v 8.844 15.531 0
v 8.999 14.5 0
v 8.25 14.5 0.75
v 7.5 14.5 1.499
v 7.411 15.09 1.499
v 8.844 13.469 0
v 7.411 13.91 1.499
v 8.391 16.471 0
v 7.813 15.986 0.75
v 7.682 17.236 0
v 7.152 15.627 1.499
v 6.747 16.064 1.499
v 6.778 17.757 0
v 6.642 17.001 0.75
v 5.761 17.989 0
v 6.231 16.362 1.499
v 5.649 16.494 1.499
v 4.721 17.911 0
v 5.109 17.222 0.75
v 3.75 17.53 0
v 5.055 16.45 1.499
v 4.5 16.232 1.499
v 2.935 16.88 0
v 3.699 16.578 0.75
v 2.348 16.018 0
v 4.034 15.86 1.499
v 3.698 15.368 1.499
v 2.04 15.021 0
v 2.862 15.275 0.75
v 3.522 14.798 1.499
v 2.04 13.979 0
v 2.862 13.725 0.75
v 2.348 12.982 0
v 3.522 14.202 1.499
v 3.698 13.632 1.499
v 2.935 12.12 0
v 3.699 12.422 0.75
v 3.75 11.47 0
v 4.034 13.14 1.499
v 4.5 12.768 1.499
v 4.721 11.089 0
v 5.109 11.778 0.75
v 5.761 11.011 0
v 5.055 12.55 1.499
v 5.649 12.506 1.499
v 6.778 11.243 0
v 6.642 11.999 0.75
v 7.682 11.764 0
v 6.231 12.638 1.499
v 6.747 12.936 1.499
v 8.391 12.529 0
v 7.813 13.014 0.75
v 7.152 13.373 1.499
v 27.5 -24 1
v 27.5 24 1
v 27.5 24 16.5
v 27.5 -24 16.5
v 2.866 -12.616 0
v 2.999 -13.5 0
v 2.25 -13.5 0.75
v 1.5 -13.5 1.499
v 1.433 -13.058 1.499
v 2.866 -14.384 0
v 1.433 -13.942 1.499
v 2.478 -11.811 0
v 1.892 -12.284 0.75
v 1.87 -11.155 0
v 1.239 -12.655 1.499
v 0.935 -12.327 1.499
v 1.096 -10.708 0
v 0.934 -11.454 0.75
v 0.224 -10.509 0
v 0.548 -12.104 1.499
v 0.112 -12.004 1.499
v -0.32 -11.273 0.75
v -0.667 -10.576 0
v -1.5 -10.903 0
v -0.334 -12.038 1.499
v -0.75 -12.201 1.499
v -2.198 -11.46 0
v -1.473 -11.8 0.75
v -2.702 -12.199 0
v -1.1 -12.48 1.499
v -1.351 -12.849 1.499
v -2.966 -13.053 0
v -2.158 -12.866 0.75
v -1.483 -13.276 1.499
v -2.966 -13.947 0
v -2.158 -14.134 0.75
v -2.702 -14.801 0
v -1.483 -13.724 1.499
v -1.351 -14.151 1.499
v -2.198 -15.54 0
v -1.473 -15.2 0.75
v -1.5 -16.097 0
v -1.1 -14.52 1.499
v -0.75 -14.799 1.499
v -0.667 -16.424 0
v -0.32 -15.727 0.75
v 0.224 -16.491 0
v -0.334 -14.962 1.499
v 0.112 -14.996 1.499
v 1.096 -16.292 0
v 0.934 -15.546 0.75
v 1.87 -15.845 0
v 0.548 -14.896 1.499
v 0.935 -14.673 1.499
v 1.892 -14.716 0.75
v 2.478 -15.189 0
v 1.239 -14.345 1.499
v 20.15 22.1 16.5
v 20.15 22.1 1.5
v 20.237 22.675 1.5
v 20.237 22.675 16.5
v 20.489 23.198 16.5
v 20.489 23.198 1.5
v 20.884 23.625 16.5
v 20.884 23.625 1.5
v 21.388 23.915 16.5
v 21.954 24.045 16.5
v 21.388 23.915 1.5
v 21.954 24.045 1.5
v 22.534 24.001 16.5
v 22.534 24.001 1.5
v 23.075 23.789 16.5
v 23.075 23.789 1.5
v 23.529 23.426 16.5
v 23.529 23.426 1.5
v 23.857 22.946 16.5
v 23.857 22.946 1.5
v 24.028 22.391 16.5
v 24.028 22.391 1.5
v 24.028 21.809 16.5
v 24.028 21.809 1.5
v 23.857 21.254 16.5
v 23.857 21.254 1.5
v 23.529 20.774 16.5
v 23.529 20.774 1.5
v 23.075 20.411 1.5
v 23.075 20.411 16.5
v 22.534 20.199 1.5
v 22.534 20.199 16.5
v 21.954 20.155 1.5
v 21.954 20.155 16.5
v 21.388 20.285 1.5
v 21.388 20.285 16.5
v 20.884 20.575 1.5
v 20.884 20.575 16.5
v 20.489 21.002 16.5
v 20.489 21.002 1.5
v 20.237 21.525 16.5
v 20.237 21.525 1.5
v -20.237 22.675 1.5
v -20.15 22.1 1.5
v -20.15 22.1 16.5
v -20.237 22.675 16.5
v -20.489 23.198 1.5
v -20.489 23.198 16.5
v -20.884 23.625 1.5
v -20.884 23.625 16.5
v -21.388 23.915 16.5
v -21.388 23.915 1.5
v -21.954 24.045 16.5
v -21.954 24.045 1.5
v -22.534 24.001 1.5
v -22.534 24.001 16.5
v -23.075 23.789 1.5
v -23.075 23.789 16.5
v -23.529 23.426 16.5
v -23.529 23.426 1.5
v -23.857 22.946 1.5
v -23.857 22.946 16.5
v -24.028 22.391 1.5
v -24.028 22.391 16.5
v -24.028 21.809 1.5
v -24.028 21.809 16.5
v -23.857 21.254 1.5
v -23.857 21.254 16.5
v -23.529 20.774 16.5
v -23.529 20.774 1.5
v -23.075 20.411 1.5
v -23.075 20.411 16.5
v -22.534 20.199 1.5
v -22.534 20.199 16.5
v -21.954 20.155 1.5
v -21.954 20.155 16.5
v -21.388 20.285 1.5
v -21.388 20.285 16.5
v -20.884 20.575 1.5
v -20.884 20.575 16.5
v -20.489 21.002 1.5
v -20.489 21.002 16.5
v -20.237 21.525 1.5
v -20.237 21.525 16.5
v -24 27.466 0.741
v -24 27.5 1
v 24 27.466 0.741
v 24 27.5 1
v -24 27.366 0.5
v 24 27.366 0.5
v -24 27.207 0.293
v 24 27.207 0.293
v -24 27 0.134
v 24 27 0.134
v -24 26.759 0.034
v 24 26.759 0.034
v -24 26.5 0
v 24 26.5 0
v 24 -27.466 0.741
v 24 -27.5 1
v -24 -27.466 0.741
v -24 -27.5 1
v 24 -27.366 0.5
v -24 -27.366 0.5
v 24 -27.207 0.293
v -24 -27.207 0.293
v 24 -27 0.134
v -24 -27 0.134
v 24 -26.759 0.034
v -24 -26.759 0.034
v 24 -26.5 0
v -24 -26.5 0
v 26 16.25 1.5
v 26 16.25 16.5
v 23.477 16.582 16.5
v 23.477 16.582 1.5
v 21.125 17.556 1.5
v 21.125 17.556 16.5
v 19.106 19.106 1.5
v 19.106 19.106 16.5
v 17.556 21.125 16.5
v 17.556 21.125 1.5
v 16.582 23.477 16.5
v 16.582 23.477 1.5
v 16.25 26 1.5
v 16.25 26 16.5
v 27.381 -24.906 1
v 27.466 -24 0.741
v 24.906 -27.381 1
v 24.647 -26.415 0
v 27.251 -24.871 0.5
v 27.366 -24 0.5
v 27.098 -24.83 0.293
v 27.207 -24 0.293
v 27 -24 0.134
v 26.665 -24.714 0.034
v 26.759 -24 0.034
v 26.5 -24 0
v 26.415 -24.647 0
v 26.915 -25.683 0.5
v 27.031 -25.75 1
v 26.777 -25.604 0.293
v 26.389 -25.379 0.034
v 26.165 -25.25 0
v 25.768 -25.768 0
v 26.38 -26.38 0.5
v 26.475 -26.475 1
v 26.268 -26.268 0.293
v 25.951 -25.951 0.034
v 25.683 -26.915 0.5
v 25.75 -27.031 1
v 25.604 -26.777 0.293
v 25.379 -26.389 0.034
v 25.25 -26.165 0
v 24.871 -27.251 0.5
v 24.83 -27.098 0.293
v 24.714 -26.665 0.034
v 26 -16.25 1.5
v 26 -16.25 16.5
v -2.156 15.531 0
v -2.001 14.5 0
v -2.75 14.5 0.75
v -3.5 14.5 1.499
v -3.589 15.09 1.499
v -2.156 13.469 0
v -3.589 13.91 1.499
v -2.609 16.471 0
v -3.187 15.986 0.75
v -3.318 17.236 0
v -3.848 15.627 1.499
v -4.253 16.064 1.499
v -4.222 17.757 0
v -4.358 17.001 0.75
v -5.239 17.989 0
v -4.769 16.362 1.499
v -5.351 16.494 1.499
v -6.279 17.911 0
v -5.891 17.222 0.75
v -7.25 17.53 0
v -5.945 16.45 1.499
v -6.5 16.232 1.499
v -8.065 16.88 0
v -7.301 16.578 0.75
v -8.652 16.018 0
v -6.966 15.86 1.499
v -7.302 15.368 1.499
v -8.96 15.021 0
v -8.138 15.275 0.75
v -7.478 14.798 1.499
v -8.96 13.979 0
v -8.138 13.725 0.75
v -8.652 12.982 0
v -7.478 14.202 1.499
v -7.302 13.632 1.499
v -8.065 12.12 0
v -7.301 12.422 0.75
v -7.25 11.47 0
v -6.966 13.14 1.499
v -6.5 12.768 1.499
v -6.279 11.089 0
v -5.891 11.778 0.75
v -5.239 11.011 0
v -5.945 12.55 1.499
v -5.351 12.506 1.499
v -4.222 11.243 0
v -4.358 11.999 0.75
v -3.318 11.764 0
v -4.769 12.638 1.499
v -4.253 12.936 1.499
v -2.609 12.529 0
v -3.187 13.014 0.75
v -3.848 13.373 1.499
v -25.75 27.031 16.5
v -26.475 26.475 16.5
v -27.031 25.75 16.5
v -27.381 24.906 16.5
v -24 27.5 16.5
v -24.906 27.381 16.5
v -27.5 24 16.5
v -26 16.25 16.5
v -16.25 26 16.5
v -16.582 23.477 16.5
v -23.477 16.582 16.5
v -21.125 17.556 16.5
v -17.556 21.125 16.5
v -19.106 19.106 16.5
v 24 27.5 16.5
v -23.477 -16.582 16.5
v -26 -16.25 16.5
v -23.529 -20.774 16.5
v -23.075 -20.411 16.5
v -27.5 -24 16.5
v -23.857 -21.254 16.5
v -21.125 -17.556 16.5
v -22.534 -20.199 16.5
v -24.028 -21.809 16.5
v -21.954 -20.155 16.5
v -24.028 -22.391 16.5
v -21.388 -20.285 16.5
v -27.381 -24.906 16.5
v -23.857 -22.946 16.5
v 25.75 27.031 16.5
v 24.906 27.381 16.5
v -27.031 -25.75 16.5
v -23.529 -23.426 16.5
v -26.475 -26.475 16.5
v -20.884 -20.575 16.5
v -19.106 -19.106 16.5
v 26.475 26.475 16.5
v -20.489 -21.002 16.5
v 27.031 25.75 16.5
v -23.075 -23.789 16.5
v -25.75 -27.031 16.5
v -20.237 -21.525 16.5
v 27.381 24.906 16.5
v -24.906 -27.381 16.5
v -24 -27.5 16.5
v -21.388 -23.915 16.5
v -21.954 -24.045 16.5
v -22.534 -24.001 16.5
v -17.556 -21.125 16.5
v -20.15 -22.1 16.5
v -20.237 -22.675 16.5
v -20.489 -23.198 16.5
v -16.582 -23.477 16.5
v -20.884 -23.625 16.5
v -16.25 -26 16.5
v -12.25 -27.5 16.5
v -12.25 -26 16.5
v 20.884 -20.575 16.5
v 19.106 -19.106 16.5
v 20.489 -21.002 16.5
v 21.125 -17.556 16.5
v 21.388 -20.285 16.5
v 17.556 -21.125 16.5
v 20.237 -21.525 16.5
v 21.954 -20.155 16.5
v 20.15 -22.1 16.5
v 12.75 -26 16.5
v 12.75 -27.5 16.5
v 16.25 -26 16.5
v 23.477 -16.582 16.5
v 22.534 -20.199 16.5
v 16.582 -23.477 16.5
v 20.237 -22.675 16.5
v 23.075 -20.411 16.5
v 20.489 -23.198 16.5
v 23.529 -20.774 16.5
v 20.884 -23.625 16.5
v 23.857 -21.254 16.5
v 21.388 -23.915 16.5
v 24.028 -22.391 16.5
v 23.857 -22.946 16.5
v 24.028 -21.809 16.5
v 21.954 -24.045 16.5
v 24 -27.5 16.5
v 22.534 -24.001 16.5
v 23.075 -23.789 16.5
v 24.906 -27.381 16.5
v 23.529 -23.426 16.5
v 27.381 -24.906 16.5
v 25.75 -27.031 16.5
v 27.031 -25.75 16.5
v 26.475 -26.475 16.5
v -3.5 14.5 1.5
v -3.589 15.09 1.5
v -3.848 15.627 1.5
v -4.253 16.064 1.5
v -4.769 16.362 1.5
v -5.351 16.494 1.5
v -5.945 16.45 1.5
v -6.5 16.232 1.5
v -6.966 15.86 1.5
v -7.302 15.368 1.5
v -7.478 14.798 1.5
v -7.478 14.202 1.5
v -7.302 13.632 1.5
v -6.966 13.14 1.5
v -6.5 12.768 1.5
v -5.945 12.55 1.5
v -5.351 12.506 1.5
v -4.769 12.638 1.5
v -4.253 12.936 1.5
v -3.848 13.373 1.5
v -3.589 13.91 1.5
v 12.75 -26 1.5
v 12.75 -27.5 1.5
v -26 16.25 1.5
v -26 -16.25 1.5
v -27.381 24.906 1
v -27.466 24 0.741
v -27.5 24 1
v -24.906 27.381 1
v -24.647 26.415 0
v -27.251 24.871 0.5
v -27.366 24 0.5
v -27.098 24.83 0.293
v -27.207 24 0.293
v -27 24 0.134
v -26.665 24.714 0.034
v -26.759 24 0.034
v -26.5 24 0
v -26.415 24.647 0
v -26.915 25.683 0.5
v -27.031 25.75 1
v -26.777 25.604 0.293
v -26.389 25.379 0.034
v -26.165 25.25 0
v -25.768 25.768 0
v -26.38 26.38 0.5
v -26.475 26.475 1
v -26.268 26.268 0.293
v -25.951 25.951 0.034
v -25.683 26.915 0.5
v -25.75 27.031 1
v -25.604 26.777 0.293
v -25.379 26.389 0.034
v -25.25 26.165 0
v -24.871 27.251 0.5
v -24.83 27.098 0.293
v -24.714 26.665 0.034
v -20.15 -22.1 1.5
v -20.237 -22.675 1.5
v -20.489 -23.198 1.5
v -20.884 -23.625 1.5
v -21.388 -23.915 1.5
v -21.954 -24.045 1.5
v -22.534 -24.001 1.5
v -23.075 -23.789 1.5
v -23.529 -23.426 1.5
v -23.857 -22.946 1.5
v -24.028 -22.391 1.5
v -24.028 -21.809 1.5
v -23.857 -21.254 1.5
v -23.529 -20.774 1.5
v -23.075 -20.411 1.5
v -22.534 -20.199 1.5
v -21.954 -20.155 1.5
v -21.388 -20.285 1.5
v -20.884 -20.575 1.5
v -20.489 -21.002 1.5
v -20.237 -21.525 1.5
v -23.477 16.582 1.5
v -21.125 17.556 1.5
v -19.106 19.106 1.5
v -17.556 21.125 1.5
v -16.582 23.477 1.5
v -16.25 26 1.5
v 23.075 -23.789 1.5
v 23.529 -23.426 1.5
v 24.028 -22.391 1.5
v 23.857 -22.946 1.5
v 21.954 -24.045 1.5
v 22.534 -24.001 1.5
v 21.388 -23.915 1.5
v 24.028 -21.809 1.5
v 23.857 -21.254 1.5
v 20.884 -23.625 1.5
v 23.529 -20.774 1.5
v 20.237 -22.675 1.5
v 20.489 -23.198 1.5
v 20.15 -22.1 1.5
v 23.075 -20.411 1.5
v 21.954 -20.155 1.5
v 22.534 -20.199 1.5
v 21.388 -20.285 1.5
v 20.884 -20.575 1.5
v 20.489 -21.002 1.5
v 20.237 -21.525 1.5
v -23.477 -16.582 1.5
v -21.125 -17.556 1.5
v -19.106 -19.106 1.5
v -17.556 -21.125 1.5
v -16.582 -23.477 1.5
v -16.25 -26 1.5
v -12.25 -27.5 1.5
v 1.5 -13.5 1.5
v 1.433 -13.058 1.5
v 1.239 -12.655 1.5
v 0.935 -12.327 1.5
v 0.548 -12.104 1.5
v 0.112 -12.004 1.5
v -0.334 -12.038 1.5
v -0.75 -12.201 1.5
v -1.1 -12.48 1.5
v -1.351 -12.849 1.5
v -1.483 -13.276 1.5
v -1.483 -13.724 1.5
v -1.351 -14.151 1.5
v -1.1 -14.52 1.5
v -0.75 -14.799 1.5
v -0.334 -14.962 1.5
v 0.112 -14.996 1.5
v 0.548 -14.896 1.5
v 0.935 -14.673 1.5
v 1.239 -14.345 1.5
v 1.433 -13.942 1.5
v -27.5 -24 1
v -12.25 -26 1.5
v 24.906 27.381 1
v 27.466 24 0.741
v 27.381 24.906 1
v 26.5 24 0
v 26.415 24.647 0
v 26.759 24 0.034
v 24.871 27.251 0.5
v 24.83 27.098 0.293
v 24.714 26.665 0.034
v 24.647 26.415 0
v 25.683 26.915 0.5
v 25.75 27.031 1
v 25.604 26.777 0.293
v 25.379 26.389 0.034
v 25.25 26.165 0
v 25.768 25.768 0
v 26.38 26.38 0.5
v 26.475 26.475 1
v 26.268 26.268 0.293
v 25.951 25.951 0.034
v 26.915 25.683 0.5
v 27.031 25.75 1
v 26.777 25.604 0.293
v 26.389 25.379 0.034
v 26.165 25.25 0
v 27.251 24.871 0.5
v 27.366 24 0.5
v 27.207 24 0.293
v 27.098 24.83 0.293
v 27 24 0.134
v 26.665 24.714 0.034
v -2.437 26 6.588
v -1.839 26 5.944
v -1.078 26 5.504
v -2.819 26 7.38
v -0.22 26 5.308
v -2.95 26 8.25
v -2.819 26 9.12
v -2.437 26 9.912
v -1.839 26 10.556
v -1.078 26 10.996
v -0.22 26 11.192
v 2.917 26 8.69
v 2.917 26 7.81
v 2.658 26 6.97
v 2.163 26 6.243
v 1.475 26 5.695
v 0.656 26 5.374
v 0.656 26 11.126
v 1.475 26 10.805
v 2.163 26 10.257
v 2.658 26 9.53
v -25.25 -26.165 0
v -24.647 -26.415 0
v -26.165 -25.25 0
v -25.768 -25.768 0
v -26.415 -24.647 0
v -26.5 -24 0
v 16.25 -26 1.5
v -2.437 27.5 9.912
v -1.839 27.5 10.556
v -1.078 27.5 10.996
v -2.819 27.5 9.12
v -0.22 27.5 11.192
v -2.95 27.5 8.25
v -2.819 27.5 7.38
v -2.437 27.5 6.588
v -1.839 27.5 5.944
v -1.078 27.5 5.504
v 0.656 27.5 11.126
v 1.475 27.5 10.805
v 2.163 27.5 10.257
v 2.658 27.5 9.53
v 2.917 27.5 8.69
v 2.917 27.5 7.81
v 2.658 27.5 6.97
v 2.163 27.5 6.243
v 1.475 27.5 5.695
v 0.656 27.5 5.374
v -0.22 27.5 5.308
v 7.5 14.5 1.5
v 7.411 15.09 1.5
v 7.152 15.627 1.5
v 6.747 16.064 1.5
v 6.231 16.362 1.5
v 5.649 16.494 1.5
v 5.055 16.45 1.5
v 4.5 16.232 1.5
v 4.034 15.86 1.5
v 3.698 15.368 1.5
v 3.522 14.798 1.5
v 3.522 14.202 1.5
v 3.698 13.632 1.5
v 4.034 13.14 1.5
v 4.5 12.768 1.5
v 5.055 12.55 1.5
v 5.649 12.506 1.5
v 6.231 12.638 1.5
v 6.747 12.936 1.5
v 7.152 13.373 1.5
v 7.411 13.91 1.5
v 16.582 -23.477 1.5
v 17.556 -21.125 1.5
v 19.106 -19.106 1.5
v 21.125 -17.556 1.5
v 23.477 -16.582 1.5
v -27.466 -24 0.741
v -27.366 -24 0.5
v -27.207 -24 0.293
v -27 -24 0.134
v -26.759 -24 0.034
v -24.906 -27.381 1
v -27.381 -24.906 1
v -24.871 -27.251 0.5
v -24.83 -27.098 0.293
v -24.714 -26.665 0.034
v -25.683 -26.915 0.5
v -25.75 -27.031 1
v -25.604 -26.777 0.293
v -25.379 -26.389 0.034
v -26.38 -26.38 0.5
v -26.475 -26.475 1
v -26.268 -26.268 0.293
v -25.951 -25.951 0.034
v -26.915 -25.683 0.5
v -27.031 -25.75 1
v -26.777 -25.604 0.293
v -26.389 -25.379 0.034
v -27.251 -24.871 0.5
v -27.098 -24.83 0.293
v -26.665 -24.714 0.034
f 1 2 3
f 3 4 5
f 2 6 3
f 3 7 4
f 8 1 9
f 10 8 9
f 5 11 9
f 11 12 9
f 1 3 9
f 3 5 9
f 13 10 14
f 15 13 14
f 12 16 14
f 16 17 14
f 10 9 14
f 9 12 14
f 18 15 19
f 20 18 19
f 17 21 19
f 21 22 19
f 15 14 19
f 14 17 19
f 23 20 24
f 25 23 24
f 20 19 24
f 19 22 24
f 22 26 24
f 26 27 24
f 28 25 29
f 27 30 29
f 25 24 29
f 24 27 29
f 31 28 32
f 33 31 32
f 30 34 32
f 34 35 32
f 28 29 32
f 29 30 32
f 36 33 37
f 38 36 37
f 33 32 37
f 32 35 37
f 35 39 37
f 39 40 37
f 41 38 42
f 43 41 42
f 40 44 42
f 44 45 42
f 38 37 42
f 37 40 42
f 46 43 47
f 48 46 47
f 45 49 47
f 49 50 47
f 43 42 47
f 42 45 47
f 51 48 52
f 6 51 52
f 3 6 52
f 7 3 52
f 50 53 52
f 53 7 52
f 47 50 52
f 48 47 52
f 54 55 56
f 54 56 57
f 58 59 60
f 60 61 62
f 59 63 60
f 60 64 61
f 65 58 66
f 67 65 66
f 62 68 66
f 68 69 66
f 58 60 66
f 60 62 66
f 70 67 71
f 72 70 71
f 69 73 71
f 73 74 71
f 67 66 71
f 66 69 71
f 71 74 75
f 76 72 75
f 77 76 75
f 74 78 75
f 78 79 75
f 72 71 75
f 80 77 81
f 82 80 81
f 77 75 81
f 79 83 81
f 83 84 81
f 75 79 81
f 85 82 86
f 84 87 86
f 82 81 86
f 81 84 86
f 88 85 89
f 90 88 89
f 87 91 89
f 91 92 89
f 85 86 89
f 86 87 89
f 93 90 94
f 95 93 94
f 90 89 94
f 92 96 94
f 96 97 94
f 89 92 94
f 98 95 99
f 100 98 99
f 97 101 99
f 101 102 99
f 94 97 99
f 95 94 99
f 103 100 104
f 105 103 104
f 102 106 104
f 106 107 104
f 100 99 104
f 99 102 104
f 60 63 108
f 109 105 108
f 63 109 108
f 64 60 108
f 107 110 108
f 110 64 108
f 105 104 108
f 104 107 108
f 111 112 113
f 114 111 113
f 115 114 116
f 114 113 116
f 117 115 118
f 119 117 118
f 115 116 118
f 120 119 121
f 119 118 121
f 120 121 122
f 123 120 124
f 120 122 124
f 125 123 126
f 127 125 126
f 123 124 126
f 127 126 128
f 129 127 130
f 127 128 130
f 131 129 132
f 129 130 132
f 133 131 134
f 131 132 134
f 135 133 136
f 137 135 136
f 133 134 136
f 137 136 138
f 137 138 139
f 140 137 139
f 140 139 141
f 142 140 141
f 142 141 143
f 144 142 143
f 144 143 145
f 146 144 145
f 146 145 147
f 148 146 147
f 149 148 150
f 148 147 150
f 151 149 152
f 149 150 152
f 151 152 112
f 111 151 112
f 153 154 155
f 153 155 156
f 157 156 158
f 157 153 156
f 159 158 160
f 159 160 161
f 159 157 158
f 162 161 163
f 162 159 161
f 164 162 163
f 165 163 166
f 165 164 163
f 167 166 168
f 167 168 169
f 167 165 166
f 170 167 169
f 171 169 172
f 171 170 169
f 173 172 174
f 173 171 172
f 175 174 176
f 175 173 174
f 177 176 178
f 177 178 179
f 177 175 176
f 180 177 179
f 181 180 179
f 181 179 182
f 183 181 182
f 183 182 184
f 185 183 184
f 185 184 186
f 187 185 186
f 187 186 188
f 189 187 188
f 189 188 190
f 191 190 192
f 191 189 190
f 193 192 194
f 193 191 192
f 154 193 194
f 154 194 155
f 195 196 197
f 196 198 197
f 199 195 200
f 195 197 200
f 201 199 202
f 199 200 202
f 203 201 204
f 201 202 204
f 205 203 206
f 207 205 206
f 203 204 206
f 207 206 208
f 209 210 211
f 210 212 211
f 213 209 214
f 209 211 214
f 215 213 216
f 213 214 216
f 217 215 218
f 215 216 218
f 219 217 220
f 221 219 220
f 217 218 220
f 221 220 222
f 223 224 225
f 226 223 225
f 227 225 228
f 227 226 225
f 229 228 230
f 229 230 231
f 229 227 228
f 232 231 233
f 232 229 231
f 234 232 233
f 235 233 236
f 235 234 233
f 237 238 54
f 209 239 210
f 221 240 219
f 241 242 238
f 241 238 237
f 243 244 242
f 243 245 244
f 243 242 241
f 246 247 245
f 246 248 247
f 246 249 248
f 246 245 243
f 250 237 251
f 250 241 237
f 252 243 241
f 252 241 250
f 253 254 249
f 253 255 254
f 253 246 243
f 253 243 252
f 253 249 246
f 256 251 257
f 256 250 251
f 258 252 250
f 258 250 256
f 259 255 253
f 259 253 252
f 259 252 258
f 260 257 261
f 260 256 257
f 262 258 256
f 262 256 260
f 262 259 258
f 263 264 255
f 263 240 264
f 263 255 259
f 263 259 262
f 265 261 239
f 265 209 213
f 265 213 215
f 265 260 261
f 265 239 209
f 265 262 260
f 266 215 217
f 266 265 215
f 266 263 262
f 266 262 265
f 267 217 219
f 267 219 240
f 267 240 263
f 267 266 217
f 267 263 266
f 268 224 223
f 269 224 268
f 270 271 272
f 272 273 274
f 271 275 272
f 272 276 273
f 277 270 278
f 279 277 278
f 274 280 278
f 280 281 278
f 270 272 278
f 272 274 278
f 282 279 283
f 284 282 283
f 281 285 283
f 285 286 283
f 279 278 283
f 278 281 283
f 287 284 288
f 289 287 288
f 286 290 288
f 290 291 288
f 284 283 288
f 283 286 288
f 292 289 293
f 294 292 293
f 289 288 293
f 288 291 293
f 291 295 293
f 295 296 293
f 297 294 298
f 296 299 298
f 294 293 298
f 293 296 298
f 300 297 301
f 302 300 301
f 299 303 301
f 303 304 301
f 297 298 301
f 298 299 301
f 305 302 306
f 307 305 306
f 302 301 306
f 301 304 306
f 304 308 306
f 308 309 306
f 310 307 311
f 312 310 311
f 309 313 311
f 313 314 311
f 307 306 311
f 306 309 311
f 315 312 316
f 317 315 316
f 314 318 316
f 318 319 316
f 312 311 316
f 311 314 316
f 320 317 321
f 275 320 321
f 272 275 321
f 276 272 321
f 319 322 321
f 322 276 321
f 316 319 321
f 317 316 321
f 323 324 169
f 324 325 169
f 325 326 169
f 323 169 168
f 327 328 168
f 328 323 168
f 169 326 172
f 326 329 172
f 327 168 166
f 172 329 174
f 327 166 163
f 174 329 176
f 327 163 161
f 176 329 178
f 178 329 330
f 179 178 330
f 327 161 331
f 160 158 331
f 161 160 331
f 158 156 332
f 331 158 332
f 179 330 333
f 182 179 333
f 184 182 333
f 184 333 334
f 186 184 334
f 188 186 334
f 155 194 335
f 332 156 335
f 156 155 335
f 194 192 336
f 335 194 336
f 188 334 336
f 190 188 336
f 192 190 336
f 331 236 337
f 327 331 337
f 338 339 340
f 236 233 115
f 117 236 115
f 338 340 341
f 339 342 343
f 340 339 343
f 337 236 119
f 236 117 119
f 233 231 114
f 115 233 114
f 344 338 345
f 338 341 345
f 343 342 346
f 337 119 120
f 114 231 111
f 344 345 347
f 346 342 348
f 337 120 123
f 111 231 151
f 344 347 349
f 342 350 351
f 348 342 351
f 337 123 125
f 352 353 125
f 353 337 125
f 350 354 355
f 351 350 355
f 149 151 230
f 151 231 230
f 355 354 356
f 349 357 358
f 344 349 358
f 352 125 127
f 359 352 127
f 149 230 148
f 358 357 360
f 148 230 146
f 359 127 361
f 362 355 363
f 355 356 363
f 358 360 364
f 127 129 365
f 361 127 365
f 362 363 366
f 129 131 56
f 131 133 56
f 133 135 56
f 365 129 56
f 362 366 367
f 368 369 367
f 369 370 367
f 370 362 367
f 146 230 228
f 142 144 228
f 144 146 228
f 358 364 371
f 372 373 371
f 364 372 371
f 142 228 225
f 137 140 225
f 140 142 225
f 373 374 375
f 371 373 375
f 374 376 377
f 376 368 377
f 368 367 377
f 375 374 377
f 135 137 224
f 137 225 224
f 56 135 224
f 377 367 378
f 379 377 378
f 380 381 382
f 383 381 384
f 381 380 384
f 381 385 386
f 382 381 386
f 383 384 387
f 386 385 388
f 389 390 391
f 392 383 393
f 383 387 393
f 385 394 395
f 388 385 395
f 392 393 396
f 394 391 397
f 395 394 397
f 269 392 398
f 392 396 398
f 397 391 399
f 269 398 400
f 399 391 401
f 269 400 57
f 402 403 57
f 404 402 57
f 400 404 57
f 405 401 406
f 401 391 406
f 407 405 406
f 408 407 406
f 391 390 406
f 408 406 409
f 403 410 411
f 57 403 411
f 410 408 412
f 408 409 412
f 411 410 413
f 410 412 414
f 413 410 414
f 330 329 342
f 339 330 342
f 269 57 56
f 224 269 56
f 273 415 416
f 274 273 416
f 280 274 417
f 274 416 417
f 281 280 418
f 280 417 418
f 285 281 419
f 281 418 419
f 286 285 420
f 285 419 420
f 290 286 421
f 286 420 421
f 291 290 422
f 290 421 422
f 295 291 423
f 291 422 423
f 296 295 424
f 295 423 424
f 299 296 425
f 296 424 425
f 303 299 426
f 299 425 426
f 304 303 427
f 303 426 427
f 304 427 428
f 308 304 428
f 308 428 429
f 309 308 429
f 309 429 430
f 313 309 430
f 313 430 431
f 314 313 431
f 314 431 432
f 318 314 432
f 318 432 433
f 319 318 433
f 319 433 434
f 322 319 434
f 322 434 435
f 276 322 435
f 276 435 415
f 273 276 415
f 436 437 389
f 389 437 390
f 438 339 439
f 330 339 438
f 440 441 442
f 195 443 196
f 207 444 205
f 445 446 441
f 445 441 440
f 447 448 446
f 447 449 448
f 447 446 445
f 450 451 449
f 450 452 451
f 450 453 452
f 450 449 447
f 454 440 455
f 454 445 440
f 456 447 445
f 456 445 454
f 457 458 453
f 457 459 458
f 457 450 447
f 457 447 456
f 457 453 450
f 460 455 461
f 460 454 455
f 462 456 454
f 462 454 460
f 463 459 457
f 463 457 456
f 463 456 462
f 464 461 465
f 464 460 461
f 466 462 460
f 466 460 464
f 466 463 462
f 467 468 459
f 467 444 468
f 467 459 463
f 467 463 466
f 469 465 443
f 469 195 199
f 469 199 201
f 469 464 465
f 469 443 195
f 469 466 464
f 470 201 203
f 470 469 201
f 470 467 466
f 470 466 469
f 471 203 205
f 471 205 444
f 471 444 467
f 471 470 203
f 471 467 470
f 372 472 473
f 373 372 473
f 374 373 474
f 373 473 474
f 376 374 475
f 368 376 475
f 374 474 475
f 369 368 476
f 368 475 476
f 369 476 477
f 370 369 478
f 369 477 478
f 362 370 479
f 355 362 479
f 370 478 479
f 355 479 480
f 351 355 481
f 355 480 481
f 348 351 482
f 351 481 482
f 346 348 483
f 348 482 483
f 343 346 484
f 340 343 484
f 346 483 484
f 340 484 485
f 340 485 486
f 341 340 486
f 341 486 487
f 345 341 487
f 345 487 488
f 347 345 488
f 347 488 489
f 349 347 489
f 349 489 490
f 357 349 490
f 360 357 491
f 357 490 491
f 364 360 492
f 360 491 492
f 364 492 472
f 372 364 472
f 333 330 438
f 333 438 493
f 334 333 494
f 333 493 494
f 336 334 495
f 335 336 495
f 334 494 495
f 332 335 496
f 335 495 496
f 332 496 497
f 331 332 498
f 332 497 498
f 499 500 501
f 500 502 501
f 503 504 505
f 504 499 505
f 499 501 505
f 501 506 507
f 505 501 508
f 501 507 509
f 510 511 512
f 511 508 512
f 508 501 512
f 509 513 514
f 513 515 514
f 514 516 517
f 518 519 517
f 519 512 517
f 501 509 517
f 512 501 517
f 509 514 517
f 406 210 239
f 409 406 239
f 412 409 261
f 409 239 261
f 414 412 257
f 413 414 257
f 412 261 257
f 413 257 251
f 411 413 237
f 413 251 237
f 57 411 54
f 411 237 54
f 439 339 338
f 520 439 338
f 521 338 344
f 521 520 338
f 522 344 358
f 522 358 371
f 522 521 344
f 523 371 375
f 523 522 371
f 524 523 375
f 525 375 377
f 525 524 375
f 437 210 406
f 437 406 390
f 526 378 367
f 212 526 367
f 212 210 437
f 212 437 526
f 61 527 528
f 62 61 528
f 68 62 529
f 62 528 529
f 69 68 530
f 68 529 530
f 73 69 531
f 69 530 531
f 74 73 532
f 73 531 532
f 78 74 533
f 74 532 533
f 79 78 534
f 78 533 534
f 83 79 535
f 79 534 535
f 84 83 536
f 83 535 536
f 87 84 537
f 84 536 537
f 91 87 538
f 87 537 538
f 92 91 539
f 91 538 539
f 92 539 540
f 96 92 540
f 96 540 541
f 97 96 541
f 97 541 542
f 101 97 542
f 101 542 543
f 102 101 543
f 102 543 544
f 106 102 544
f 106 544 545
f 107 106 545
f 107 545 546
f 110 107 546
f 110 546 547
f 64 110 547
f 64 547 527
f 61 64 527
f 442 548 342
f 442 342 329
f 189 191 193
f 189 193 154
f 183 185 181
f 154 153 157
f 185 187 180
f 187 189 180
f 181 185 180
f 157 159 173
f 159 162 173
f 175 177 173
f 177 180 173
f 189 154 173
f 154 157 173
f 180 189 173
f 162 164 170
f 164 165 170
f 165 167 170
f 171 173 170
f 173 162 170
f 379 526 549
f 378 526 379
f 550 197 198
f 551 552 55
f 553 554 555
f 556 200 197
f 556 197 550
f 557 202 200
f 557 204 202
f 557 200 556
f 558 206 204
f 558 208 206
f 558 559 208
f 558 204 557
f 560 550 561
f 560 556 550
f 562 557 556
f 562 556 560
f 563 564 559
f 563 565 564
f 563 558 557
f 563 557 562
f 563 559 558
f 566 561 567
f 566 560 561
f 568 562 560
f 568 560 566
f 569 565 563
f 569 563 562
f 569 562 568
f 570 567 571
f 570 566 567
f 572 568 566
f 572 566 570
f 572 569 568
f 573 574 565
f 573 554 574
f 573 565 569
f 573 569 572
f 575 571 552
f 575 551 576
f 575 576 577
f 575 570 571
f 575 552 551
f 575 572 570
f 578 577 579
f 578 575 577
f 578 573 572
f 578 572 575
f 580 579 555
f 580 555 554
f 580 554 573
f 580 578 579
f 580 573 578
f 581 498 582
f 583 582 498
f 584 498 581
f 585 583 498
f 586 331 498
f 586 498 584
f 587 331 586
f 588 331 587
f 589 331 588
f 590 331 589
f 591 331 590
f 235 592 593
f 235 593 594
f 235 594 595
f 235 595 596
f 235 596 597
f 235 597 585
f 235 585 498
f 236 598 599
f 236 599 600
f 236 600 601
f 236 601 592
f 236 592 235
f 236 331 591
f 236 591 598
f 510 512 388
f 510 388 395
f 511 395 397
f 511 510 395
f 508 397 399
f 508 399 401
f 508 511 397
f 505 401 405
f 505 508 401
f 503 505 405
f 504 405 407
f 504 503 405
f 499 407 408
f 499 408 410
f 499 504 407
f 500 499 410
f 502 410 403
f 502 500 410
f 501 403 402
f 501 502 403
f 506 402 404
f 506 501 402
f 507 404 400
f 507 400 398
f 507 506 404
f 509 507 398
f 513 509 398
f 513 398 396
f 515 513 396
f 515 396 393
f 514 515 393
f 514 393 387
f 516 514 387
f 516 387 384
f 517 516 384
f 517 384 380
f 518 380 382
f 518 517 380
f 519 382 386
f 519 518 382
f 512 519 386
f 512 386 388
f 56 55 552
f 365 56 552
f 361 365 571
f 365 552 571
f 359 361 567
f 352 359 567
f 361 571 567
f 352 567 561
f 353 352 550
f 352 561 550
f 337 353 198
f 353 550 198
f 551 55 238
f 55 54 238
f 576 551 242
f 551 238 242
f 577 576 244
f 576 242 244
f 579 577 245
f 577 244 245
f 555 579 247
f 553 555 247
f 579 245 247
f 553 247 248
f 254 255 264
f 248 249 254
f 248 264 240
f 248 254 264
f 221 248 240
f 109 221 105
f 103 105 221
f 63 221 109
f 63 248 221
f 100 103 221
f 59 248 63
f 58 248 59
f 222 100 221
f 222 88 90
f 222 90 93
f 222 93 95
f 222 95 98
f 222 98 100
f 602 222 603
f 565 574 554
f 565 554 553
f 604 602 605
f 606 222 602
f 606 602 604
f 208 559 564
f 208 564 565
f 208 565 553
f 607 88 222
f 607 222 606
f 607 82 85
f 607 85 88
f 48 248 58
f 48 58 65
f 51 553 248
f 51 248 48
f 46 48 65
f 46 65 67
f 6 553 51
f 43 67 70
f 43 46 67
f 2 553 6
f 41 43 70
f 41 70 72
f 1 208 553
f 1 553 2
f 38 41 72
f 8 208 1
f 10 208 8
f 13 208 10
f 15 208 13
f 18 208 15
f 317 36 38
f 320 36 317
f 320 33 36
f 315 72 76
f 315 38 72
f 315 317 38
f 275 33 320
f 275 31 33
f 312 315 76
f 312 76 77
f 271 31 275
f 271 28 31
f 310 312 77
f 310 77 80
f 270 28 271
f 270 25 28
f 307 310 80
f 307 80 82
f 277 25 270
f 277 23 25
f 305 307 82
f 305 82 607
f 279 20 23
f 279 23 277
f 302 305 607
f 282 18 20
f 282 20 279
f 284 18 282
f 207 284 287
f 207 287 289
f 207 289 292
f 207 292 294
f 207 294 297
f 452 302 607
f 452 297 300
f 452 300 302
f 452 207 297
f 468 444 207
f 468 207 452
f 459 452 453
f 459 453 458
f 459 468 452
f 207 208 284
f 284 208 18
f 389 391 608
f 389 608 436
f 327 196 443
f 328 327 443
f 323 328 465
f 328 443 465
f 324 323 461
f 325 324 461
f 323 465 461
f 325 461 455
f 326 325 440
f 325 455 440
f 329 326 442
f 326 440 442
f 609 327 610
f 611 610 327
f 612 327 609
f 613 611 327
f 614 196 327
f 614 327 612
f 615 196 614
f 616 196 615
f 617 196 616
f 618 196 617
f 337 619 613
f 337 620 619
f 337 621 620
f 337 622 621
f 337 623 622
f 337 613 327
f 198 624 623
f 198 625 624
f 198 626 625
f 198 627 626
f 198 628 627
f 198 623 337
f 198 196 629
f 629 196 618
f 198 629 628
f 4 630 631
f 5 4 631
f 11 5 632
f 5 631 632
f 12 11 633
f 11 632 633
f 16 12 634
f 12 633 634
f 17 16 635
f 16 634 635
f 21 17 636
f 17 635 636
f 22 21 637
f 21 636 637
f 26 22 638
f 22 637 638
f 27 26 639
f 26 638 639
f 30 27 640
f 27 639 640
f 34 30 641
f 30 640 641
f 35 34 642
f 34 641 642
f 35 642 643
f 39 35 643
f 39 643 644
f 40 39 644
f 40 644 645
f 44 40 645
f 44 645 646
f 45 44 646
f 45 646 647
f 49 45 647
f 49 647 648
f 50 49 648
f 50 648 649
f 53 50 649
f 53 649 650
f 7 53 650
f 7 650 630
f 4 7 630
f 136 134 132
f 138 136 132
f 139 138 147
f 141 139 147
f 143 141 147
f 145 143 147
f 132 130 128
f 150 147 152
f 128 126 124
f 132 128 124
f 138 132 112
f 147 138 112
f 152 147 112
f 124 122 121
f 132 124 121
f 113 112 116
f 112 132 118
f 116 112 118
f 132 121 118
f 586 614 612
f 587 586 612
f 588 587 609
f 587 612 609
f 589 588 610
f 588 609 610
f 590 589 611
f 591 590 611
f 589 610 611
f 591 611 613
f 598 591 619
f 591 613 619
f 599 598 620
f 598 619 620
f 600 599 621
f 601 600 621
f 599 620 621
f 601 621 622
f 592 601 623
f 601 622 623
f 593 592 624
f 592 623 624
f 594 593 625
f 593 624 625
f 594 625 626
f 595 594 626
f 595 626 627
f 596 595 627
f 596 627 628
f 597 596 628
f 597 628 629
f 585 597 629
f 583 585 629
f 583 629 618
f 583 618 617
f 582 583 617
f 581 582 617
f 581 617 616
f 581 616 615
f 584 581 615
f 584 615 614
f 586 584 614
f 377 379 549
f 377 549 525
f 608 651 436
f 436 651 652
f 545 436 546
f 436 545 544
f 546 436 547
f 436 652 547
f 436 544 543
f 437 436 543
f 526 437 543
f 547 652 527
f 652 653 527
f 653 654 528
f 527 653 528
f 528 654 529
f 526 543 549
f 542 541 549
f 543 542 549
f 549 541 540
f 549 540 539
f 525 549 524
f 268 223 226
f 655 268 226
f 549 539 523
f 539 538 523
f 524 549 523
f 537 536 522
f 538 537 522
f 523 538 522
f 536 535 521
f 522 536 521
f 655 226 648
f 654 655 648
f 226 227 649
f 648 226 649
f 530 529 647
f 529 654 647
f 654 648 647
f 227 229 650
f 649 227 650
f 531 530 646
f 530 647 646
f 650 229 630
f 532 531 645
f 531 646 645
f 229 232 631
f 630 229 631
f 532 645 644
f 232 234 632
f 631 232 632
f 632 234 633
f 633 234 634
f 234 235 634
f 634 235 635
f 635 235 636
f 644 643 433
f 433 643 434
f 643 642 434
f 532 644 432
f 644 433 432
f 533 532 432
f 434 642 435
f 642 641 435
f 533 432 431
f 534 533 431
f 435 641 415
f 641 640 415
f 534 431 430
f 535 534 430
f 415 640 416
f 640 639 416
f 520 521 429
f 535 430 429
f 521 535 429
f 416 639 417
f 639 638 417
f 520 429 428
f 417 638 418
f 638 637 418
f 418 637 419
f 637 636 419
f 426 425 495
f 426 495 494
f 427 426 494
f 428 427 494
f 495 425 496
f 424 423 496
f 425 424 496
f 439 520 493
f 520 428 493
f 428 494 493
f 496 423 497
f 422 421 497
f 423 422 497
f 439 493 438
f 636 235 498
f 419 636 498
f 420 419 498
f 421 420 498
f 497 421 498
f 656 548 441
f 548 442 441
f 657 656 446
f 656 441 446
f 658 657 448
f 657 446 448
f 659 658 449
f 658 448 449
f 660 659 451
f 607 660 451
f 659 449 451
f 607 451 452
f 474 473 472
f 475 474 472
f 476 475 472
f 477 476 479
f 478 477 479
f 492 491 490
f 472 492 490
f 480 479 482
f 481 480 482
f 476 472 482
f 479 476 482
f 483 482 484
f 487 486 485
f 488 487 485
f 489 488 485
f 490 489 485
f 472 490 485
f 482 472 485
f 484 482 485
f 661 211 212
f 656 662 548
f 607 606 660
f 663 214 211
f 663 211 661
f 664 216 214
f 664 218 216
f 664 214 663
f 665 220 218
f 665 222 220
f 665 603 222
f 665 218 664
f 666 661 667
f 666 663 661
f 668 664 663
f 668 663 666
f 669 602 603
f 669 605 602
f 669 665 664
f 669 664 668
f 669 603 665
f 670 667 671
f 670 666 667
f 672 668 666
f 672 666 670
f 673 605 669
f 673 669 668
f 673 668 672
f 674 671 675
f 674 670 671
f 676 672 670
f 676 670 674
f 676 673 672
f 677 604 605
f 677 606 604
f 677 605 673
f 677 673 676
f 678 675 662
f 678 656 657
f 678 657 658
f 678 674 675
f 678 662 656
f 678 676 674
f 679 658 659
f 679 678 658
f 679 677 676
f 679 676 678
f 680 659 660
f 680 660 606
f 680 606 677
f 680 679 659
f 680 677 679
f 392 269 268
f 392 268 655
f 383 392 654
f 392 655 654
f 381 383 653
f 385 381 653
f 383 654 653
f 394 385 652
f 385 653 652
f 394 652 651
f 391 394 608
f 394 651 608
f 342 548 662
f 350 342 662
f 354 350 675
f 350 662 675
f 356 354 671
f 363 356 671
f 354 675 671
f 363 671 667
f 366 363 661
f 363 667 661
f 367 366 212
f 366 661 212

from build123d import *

# Parameters (mm, degrees)
PAD_DEPTH               = 16.5
POCKET_DEPTH            = 15
SKETCH002_R             = 1.95
PAD001_DEPTH            = 15
SKETCH002_MIRRORED_2_R  = 1.95
PAD001_MIRRORED_2_DEPTH = 15
FILLET_R                = 1
SKETCH008_W             = 25
SKETCH008_H             = 15
POCKET003_DEPTH         = 5
SKETCH010_R             = 1.5
SKETCH010_R_2           = 2
POCKET004_DEPTH         = 5
SKETCH011_R             = 2.95
POCKET005_DEPTH         = 5
CHAMFER_SIZE            = 1.499


with BuildPart() as part:
    # Sketch → Pad (new body)
    with BuildSketch(Plane.XY):
        with BuildLine():
            Line((-24, 27.5), (24, 27.5))
            ThreePointArc((27.5, 24), (26.474874, 26.474874), (24, 27.5))
            Line((27.5, 24), (27.5, -24))
            ThreePointArc((24, -27.5), (26.474874, -26.474874), (27.5, -24))
            Line((24, -27.5), (-24, -27.5))
            ThreePointArc((-27.5, -24), (-26.474874, -26.474874), (-24, -27.5))
            Line((-27.5, -24), (-27.5, 24))
            ThreePointArc((-24, 27.5), (-26.474874, 26.474874), (-27.5, 24))
        make_face()
    extrude(amount=PAD_DEPTH)

    # Sketch001 (on Face10 of Pad) → Pocket (cut)
    with BuildSketch(Plane.XY.offset(16.5)):
        with BuildLine():
            Line((-24.25, 26), (24.25, 26))
            ThreePointArc((26, 24.25), (25.487437, 25.487437), (24.25, 26))
            Line((26, 24.25), (26, -24.25))
            ThreePointArc((24.25, -26), (25.487437, -25.487437), (26, -24.25))
            Line((24.25, -26), (-24.25, -26))
            ThreePointArc((-26, -24.25), (-25.487437, -25.487437), (-24.25, -26))
            Line((-26, -24.25), (-26, 24.25))
            ThreePointArc((-24.25, 26), (-25.487437, 25.487437), (-26, 24.25))
        make_face()
    extrude(amount=-POCKET_DEPTH, mode=Mode.SUBTRACT)

    # Sketch002 (on Face19 of Pocket) → Pad001 (join)
    with BuildSketch(Plane.XY.offset(1.5)):
        with BuildLine():
            Line((-26, 16.25), (-26, 26))
            Line((-26, 26), (-16.25, 26))
            ThreePointArc((-26, 16.25), (-19.105709, 19.105709), (-16.25, 26))
        make_face()
        with Locations((-22.1, 22.1)):
            Circle(SKETCH002_R, mode=Mode.SUBTRACT)
    pad001 = extrude(amount=PAD001_DEPTH)

    # Sketch002 Mirrored 2 → Pad001 Mirrored 2 (add)
    with BuildSketch(Plane(origin=(0, 0, 1.5), x_dir=(-1, 0, 0), z_dir=(0, 0, -1))):
        with BuildLine():
            Line((-26, 16.25), (-26, 26))
            Line((-26, 26), (-16.25, 26))
            ThreePointArc((-26, 16.25), (-19.105709, 19.105709), (-16.25, 26))
        make_face()
        with Locations((-22.1, 22.1)):
            Circle(SKETCH002_MIRRORED_2_R, mode=Mode.SUBTRACT)
    pad001_mirrored_2 = extrude(amount=-PAD001_MIRRORED_2_DEPTH)

    # Mirrored001: Pad001, Pad001 Mirrored 2 across Sketch002 H_Axis
    add(pad001.mirror(Plane(origin=(0, 0, 1.5), x_dir=(0, 0, 1), z_dir=(0, 1, 0))))
    add(pad001_mirrored_2.mirror(Plane(origin=(0, 0, 1.5), x_dir=(0, 0, 1), z_dir=(0, 1, 0))))

    # Fillet
    fillet_edges = [part.edges().sort_by_distance(p)[0] for p in [
        (-27.5, 0, 0),
        (-26.474874, 26.474874, 0),
        (0, 27.5, 0),
        (26.474874, 26.474874, 0),
        (27.5, 0, 0),
        (26.474874, -26.474874, 0),
        (0, -27.5, 0),
        (-26.474874, -26.474874, 0),
    ]]
    fillet(fillet_edges, radius=FILLET_R)

    # Sketch008 (on Face7 of Fillet) → Pocket003 (cut)
    with BuildSketch(Plane.XZ.offset(27.5)):
        with Locations((0.25, 9)):
            Rectangle(SKETCH008_W, SKETCH008_H)
    extrude(amount=-POCKET003_DEPTH, mode=Mode.SUBTRACT)

    # Sketch010 (on Face35 of Pocket003) → Pocket004 (cut)
    with BuildSketch(Plane.XY.offset(1.5)):
        with Locations((0, -13.5)):
            Circle(SKETCH010_R)
        with Locations((-5.5, 14.5)):
            Circle(SKETCH010_R_2)
        with Locations((5.5, 14.5)):
            Circle(SKETCH010_R_2)
    extrude(amount=-POCKET004_DEPTH, mode=Mode.SUBTRACT)

    # Sketch011 (on Face10 of Pocket004) → Pocket005 (cut)
    with BuildSketch(Plane(origin=(0, 27.5, 0), x_dir=(-1, 0, 0), z_dir=(0, 1, 0))):
        with Locations((0, 8.25)):
            Circle(SKETCH011_R)
    extrude(amount=-POCKET005_DEPTH, mode=Mode.SUBTRACT)

    # Chamfer
    chamfer_edges = [part.edges().sort_by_distance(p)[0] for p in [
        (3.5, 14.5, 0),
        (-7.5, 14.5, 0),
        (-1.5, -13.5, 0),
    ]]
    chamfer(chamfer_edges, length=CHAMFER_SIZE)


solid = part.part
